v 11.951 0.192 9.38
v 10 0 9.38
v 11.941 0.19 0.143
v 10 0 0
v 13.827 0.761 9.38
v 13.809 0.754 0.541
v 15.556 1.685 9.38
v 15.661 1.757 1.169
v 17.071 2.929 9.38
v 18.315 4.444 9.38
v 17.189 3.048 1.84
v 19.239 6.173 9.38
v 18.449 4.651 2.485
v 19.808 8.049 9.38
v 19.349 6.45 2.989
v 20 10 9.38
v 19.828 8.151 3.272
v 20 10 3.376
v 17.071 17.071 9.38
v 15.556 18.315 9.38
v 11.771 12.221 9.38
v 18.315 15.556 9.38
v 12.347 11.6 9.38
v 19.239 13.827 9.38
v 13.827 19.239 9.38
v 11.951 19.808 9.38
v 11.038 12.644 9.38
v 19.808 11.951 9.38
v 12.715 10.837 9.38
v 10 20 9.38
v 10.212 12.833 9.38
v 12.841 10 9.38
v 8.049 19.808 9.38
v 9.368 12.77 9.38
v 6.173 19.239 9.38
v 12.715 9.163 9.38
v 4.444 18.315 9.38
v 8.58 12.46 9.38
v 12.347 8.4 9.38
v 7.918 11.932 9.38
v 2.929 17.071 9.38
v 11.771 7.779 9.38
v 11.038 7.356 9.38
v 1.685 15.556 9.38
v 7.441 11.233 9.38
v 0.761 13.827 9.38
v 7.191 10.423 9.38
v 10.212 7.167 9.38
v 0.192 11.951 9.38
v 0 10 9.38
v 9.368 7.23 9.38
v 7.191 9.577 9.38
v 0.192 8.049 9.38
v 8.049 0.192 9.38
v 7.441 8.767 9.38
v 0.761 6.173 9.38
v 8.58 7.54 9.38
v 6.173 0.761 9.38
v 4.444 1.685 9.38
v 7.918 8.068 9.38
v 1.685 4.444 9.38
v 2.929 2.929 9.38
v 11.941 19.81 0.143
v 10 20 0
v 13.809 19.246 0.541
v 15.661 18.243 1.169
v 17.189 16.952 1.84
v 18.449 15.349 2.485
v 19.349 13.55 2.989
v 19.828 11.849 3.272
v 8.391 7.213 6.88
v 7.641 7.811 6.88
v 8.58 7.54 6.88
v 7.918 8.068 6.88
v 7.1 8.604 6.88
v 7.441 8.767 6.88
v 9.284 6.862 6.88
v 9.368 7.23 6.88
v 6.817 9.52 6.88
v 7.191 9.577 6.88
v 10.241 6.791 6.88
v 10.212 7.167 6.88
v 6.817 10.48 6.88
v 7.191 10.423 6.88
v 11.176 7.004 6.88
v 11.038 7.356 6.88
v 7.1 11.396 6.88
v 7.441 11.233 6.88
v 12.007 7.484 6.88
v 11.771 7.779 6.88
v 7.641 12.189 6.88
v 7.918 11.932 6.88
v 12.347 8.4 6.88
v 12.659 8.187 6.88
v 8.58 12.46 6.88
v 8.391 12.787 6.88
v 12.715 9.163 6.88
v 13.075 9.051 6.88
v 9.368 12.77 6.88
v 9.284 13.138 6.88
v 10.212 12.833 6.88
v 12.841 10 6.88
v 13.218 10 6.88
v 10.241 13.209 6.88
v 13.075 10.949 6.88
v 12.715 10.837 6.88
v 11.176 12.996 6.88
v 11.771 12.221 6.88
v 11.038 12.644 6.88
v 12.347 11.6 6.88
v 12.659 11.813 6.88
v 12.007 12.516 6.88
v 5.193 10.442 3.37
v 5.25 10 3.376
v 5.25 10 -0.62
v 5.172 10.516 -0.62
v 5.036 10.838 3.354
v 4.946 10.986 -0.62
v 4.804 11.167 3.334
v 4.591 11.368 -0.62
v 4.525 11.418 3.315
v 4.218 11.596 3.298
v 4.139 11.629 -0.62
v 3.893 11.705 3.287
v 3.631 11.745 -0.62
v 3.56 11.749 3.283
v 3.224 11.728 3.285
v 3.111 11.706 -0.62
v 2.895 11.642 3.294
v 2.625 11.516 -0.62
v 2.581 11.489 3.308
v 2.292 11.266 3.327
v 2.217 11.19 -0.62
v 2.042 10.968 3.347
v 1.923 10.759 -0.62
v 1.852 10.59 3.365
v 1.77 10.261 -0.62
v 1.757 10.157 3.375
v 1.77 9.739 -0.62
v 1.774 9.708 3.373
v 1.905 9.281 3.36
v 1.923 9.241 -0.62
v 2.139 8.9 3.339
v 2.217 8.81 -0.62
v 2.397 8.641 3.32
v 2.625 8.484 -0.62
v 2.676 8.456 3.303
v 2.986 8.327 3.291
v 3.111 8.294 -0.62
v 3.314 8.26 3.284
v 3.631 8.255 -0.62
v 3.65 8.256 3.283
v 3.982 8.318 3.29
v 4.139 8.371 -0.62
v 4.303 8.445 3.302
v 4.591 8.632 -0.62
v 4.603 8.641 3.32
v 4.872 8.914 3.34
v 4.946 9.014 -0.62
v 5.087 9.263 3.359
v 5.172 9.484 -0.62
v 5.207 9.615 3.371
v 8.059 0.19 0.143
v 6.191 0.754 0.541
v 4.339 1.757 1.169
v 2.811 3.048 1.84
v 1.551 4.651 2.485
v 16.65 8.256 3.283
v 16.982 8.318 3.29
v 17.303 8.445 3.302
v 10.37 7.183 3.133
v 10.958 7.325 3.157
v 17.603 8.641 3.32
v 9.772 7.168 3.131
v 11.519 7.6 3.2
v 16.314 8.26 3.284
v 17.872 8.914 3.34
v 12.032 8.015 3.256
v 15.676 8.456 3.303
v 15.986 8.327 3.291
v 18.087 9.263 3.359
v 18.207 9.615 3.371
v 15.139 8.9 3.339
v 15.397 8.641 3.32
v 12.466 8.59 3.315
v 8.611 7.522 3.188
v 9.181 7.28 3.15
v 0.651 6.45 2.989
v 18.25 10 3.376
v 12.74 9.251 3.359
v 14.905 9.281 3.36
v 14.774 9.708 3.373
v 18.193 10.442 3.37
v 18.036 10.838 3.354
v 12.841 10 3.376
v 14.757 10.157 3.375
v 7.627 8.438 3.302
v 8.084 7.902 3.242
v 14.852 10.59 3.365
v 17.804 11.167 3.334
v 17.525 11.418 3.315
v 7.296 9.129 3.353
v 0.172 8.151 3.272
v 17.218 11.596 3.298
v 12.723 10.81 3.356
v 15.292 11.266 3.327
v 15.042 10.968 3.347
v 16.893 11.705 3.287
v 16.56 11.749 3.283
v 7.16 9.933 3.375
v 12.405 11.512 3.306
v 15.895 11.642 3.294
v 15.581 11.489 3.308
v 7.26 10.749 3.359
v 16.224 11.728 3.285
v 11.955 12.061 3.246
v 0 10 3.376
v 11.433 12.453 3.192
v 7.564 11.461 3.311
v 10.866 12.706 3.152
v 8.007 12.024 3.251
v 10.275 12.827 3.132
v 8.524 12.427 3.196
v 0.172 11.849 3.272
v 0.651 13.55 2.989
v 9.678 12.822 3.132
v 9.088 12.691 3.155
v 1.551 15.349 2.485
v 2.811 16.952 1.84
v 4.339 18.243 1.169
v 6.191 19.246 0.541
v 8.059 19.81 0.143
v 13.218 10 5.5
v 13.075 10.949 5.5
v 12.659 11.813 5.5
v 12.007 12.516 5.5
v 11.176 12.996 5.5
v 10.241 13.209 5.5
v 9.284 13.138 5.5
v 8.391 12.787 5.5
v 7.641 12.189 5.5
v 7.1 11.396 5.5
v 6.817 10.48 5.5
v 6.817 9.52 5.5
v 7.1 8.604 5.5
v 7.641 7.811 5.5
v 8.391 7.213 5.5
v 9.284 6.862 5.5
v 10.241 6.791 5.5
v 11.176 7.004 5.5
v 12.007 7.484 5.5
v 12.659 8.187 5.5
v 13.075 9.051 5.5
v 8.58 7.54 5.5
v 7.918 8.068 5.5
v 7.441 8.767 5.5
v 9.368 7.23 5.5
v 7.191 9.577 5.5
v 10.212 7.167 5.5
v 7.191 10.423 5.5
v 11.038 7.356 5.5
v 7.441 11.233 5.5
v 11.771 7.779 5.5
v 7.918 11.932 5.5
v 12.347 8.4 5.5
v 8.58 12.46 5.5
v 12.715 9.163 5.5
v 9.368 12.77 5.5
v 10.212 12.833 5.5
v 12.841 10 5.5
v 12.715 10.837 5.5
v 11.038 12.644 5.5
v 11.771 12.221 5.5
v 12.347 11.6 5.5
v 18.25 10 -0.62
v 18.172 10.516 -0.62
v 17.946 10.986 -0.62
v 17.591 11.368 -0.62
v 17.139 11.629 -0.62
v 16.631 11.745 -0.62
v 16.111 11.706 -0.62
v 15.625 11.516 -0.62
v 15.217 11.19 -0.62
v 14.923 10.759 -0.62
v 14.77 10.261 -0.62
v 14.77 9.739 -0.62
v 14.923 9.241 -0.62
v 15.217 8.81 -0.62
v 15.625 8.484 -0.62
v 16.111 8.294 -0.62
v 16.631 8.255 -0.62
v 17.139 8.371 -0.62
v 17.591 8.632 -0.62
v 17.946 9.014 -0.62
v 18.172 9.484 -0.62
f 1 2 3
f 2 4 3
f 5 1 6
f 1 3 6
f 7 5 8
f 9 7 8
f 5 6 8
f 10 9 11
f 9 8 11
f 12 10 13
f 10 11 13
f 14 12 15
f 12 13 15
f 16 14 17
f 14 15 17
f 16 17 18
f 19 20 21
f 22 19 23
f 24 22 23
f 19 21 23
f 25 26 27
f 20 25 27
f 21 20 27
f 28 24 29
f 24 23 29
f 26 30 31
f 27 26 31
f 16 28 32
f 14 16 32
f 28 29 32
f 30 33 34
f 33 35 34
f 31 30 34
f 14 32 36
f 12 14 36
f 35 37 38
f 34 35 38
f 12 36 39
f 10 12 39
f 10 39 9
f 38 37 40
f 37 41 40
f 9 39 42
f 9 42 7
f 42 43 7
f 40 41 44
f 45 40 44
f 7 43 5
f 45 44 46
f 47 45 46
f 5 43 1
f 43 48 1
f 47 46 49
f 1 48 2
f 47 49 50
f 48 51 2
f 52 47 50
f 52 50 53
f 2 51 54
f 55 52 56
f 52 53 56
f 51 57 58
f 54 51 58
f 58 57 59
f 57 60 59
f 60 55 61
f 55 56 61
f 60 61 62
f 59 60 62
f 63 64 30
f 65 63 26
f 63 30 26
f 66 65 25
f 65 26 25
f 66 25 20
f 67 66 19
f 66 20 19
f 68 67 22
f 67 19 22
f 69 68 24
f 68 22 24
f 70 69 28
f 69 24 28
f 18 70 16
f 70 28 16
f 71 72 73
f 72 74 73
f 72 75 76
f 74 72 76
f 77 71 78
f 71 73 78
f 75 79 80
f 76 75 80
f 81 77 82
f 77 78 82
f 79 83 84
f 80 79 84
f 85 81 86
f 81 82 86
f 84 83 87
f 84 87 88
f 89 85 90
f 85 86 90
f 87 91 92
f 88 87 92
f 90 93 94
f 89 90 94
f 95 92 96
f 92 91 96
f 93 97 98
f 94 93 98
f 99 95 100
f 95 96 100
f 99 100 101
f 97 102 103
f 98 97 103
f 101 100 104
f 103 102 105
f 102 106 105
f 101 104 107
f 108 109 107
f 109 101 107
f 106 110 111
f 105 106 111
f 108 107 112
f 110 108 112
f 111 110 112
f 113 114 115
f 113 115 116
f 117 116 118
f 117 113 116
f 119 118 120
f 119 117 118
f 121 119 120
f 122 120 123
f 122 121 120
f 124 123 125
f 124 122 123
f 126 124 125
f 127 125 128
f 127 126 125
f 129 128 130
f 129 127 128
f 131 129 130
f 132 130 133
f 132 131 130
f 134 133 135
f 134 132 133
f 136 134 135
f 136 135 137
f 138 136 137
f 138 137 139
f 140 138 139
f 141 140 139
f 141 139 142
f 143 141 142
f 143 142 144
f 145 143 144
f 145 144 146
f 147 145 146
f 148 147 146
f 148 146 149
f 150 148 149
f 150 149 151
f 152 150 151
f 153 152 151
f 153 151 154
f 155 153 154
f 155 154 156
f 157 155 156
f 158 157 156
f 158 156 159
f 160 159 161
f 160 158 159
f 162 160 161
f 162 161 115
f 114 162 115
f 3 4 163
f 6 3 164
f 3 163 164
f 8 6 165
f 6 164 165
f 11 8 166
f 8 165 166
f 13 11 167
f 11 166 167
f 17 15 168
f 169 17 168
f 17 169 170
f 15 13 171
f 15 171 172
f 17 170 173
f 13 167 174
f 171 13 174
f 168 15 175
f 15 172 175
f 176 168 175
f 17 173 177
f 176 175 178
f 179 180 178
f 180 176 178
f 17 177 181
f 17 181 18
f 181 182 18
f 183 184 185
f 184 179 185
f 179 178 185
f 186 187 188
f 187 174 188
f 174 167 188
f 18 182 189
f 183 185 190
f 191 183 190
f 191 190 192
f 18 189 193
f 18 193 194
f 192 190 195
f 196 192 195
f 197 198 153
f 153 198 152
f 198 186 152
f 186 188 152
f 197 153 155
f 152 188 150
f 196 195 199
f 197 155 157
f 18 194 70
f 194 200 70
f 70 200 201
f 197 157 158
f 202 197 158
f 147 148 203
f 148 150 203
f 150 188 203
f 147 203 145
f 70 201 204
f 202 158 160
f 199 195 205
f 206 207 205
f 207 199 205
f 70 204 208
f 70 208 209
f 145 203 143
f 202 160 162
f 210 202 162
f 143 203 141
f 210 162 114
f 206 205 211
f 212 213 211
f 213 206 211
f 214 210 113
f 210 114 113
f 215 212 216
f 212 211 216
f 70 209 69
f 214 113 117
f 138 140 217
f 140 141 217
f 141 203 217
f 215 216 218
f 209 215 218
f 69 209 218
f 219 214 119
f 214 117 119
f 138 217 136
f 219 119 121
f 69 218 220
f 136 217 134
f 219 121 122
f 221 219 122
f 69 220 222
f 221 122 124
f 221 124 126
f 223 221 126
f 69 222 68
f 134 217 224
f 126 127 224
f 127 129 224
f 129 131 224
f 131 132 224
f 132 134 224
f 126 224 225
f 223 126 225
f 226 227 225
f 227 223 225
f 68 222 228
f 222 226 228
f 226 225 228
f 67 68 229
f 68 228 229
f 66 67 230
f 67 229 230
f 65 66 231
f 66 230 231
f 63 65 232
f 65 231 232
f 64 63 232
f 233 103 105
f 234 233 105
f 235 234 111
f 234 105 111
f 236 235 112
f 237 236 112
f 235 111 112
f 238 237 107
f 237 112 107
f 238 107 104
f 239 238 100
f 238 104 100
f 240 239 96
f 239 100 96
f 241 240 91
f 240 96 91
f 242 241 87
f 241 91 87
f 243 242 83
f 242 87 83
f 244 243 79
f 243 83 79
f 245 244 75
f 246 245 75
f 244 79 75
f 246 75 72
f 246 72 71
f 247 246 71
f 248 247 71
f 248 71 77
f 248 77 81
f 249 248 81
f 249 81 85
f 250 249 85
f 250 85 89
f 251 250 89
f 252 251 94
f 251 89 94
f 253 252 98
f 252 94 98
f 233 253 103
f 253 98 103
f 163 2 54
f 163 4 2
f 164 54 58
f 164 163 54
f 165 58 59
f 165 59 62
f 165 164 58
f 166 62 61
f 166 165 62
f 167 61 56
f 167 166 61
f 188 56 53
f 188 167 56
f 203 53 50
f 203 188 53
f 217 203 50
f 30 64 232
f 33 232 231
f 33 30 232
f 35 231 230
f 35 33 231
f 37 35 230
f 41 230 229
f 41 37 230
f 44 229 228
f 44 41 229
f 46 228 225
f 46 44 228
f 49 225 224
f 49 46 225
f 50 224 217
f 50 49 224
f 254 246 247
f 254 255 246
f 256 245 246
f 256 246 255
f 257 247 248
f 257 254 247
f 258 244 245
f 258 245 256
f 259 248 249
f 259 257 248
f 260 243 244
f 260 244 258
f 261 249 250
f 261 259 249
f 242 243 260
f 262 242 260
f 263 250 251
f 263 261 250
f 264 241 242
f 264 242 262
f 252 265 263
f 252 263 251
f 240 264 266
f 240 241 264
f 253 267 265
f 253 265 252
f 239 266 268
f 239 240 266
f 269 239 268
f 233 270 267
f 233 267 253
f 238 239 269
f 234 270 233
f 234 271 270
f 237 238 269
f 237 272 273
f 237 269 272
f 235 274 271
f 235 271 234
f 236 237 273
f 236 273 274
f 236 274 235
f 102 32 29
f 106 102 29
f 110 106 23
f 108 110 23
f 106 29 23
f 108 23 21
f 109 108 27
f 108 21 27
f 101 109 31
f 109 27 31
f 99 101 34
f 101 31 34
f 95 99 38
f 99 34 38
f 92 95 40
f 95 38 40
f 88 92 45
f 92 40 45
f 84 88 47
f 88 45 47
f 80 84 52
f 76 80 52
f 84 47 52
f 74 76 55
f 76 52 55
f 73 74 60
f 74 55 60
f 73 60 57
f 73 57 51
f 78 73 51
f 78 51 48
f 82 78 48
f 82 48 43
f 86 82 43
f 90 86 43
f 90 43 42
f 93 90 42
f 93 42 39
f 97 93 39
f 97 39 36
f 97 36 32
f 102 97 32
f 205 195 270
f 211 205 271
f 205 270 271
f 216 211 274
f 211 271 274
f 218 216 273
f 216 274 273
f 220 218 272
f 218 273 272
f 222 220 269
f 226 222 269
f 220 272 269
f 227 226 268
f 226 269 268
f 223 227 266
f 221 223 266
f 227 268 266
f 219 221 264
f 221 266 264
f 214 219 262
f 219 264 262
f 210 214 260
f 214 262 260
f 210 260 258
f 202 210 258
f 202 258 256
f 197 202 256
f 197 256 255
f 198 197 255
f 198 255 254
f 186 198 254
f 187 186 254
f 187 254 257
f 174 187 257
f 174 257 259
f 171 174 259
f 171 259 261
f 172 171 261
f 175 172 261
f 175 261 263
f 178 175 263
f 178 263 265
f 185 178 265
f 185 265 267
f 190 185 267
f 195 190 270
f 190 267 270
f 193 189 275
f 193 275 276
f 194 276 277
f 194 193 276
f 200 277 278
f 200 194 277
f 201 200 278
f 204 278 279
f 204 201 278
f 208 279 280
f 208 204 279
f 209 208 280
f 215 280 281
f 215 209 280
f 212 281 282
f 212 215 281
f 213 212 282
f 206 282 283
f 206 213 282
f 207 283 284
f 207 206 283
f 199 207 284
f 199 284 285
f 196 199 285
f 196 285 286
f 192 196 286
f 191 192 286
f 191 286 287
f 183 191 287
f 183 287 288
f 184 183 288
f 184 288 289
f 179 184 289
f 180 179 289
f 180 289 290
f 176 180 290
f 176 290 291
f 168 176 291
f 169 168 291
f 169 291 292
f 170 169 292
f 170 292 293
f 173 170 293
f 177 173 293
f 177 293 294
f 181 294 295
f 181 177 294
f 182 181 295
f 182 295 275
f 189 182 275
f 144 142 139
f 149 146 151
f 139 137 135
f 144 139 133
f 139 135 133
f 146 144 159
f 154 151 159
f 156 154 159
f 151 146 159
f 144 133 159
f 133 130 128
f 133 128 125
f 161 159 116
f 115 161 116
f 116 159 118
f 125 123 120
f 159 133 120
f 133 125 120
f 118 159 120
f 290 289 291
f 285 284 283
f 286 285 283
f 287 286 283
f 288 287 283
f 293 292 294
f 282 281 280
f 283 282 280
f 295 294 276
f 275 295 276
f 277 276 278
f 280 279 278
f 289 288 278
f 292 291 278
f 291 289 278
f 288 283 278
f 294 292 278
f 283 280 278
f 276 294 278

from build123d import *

# Parameters (mm, degrees)
BOSS_EXTRUDE2_DEPTH     = 20
FILLET1_R               = 10
CUT_EXTRUDE2_REACH      = 31.799
CUT_EXTRUDE2_END_RADIUS = 16.5
SKETCH4_R               = 2.8408
CUT_EXTRUDE3_START      = -2.5
SKETCH5_R               = 3.21845
CUT_EXTRUDE3_DEPTH      = 1.38
BOSS_EXTRUDE3_START     = -6
SKETCH6_R               = 1.75
BOSS_EXTRUDE3_DEPTH     = 4


with BuildPart() as part:
    # Sketch3 → Boss-Extrude2 (new body)
    with BuildSketch(Plane(origin=(0, 0, 0), x_dir=(0, 0, -1), z_dir=(1, 0, 0))):
        with BuildLine():
            Line((0, 20), (-9.38, 20))
            Line((-9.38, 20), (-9.38, 0))
            Line((-9.38, 0), (0, 0))
            ThreePointArc((0, 0), (-3.375595252, 10), (0, 20))
        make_face()
    extrude(amount=BOSS_EXTRUDE2_DEPTH)

    # Fillet1
    fillet1_edges = [part.edges().sort_by_distance(p)[0] for p in [
        (20, 0, 4.69),
        (0, 0, 4.69),
        (20, 20, 4.69),
        (0, 20, 4.69),
    ]]
    fillet(fillet1_edges, radius=FILLET1_R - 0.0001)  # a hair under: the kernel refuses the full size

    # Cut-Extrude2: up to this cylinder (the profile starts outside it)
    cut_extrude2_end = Plane(origin=(10, 10, -13.124404748), z_dir=(-1, 0, 0)) * Cylinder(CUT_EXTRUDE2_END_RADIUS, 97.598, mode=Mode.PRIVATE)
    # Sketch4 → Cut-Extrude2 (cut, up to the surface)
    with BuildSketch(Plane.XY.offset(9.38), mode=Mode.PRIVATE) as cut_extrude2_sk1:
        with Locations((10, 10)):
            Circle(SKETCH4_R)
    cut_extrude2_tool1 = extrude(cut_extrude2_sk1.sketch, amount=-CUT_EXTRUDE2_REACH, mode=Mode.PRIVATE) - cut_extrude2_end
    add(cut_extrude2_tool1.solids().sort_by_distance((10, 10, 9.38))[0], mode=Mode.SUBTRACT)

    # Sketch5 → Cut-Extrude3 (cut)
    with BuildSketch(Plane.XY.offset(9.38).offset(CUT_EXTRUDE3_START)):
        with Locations((10, 10)):
            Circle(SKETCH5_R)
    extrude(amount=-CUT_EXTRUDE3_DEPTH, mode=Mode.SUBTRACT)

    # Sketch6 → Boss-Extrude3 (add)
    with BuildSketch(Plane.XY.offset(9.38).offset(BOSS_EXTRUDE3_START)):
        with Locations((3.5, 10)):
            Circle(SKETCH6_R)
        with Locations((16.5, 10)):
            Circle(SKETCH6_R)
    extrude(amount=-BOSS_EXTRUDE3_DEPTH)


solid = part.part
